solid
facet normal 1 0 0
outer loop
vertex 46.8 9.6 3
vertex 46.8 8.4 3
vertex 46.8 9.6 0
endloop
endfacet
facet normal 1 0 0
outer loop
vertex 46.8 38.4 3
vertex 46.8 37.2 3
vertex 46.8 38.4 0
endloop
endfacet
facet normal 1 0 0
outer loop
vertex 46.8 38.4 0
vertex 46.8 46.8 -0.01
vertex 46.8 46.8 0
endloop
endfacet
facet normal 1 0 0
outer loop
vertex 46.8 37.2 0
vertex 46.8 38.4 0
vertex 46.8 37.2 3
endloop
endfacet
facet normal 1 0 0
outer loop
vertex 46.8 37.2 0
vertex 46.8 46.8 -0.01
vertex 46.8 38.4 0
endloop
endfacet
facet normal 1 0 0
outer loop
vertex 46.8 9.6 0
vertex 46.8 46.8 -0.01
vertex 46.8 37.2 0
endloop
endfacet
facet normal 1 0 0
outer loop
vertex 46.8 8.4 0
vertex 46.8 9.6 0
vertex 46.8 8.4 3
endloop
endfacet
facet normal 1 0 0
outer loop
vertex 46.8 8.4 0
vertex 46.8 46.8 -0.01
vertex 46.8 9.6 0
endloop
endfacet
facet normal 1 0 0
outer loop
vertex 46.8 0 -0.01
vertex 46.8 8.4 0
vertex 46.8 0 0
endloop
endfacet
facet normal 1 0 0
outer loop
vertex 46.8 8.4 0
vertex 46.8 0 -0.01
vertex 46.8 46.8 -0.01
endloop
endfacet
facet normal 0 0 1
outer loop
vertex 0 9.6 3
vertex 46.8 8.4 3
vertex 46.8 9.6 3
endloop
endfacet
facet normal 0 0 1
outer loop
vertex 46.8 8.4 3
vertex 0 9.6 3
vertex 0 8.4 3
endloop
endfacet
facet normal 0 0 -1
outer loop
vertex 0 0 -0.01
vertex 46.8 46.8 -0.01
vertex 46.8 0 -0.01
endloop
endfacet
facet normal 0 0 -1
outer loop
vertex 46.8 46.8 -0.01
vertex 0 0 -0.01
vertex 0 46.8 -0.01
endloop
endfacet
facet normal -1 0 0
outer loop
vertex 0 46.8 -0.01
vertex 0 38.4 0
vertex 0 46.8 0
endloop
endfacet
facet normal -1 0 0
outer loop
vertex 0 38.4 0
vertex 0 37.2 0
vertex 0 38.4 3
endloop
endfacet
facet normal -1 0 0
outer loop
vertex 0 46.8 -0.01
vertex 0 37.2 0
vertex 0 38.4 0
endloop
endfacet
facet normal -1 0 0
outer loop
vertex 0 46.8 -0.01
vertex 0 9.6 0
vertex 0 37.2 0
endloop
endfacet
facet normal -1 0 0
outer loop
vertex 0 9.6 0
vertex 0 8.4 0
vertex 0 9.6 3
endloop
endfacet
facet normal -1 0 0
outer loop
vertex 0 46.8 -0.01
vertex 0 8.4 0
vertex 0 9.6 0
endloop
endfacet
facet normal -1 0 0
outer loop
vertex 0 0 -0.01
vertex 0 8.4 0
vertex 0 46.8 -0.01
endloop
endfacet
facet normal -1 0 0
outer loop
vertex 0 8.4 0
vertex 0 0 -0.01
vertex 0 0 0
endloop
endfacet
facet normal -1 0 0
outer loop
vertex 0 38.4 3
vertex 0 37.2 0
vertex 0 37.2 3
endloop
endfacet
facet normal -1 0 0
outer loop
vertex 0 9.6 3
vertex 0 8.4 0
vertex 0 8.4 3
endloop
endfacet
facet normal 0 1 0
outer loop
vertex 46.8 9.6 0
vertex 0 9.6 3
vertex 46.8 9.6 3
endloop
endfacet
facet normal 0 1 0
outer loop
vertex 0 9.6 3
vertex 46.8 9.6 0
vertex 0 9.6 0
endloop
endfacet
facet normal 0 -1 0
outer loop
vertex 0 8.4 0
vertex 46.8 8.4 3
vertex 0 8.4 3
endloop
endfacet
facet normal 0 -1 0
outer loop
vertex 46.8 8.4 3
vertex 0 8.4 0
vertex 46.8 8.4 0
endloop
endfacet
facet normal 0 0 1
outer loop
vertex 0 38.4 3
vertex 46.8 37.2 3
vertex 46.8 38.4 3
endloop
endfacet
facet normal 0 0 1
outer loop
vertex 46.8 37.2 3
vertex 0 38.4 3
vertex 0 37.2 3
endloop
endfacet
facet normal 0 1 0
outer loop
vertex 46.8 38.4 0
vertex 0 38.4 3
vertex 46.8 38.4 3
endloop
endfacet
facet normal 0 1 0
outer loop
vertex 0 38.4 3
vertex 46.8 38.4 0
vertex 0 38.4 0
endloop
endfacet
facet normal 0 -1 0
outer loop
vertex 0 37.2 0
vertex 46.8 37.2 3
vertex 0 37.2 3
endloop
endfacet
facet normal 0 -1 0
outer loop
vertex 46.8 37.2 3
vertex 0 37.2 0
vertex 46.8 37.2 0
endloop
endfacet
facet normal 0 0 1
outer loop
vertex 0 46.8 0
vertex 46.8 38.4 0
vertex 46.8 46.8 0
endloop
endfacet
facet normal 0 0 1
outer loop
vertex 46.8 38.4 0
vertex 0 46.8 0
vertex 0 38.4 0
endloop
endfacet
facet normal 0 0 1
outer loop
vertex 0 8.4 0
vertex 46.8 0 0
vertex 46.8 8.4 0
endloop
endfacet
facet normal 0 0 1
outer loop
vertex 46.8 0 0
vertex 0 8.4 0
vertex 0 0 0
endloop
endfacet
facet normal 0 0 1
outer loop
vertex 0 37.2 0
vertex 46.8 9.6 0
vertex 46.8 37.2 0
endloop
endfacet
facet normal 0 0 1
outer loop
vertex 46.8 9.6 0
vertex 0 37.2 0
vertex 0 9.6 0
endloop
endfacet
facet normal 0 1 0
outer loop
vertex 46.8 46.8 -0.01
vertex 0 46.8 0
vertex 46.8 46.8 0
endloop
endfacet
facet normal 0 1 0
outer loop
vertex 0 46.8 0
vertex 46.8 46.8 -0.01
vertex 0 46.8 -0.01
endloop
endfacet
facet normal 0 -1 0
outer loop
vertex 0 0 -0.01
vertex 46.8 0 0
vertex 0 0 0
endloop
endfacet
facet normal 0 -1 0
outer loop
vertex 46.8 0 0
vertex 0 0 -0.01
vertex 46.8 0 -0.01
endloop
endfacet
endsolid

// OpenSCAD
// file: ../Base/Helper.scad
// Fischertechnik Box Foundation
// Helper functions

include <PlacementOptions.scad>

// getRotation(rotations, i)
// gets the rotation with index i, even if rotations or rotations[i] is undefined.
// If undefined, NoRotation ist returned.
// rotations = list of Rotate-constants
// i = Index of the rotation
function getRotation(rotations, i) = (is_undef(rotations) || is_undef(rotations[i])) ? NoRotation : rotations[i];
// file: ../Base/PlacementOptions.scad
// Fischertechnik Box Foundation
// Placement Options

// Alignment
NoAlign = 0;
AlignLeft = 1;
AlignBottom = 2;
AlignCenter = 3;
AlignRight = 4;
AlignTop = 5;

// Element rotation degree steps
rotations = [0, -90, -180, -270];

// Rotation
NoRotation = 0;
Rotate0 = 0;
Rotate90 = 1;
Rotate180 = 2;
Rotate270 = 3;

// Docking (seen from above)
NoDock = -1;
DockLeft = 0;
DockTop = 1;
DockRight = 2;
DockCorner = 2;
DockBottom = 3;

// Web corners
LowerLeft = 0;
UpperLeft = 1;
UpperRight = 2;
LowerRight = 3;

// Web position relative to corner
LeftOfCorner = 0;
RightOfCorner = 1;
// file: ../Base/Boxes.scad
// Fischertechnik Box Foundation
// Pre-designed Boxes

use <Constants.scad>

include <PlacementOptions.scad>

box190Width = 190;
box190Depth = 130;
box130Width = 130;
box130Depth = 95;

// Values are from an original ec3 box
topBottomDifference = 1.5;
outerHeight = 40;
innerHeight = 38.2;
baseThickness = outerHeight - innerHeight;
stackExcess = 5.7;
radius = 3.5;
wallThickness = 1.5;
tolerance = 0.2;
stackOffset = innerHeight - stackExcess;

boxUsageHeight = stackOffset;
boxWallThickness = wallThickness;
boxBaseThickness = baseThickness;
boxWebWidth = 3.0;

// getBoxWallThickness()
// Gets the wall thickness of a Fischertechnik Box
function getBoxWallThickness() = boxWallThickness;

// getBoxUsageHeight()
// Gets the usable height of a Fischertechnik box
function getBoxUsageHeight() = boxUsageHeight;

// getBoxInnerHeight()
// Gets the inner height of a Fischertechnik box, including the stack excess
function getBoxInnerHeight() = innerHeight;

// getBoxBaseThickness()
// Gets the thickness of the Fischertechnik box base.
function getBoxBaseThickness() = boxBaseThickness;

// getBoxWebWidth()
// Gets the width of a box web
function getBoxWebWidth() = boxWebWidth;

// getBox190Space()
// Gets the usable inner space of a Box 190 as an x/y-list
function getBox190Space() = [
    box190Width - 2*getBoxWallThickness() - topBottomDifference, 
    box190Depth - 2*getBoxWallThickness() - topBottomDifference ];

// BoxBase(width, depth)
// Creates an empty stackable Fischertechnik compatible box
// width = Outer width of the box (190, 130, ...)
// depth = Outer depth of the box (130, 95, ...)

module BoxBase(width, depth, height=outerHeight) {    
    thinPlate = 0.01;

    innerHeight = height - baseThickness;    
    
    module BodyPlate(width, depth) {
        translate([radius, radius])
        hull() {
            w = width-2*radius;
            d = depth-2*radius;
            cube([w, d, thinPlate]);
            cylinder(thinPlate, r=radius, $fn=getFragments());
            translate([w, 0])
                cylinder(thinPlate, r=radius, $fn=getFragments());
            translate([w, d])
                cylinder(thinPlate, r=radius, $fn=getFragments());
            translate([0, d])
                cylinder(thinPlate, r=radius, $fn=getFragments());
        }
    }
    
    module Body(tolerance=tolerance) {
        hull() {
            // Bottom with tolerance to fit into the original boxes when stacked
            translate([-wallThickness+tolerance, -wallThickness+tolerance, -baseThickness])
                BodyPlate(width-topBottomDifference-2*tolerance, depth-topBottomDifference-2*tolerance);
            
            // Top
            translate([-wallThickness-topBottomDifference/2, -wallThickness-topBottomDifference/2, innerHeight-thinPlate])
                BodyPlate(width, depth);
         }
    }

    module Cutoff() {
        hull() {
            coWidth = width - 2*wallThickness;
            coDepth = depth - 2*wallThickness;
            
            // Bottom
            BodyPlate(coWidth-topBottomDifference, coDepth-topBottomDifference);

            // Top
            translate([-topBottomDifference/2, -topBottomDifference/2, innerHeight+thinPlate]) 
                BodyPlate(coWidth, coDepth);
        }
    }
    
    difference() {        
        Body();
        Cutoff();
        stackOffset = innerHeight - stackExcess;
        translate([0, 0, stackOffset + baseThickness])
            Body(tolerance=0);
    }
}

// Creates the Fischertechnik empty box 130x190 mm and places it at position 0,0
// 190x130 are the outer sizes, the inner space is slightly smaller. Use getBox190Space() to get the inner sizes.
// The box is positioned that the usable inner space is at the 0,0,0 position. The

module Box190() {
    BoxBase(box190Width, box190Depth);
}

// Gets the usable inner space of a Box 130 as an x/y-list
function getBox130Space() = [
    box130Width - 2*getBoxWallThickness() - topBottomDifference, 
    box130Depth - 2*getBoxWallThickness() - topBottomDifference ];

// Creates the Fischertechnik empty box 95x130 mm and places it at position 0,0
// 190x130 are the outer sizes, the inner space is slightly smaller. Use getBox190Space() to get the inner sizes.
// The box is positioned that the usable inner space is at the 0,0,0 position. The

module Box130() {
    BoxBase(box130Width, box130Depth);
}

// Creates a web at the specified box walls
// corner 0 = LowerLeft, 1 = UpperLeft, 2 = UpperRight, 3 = LowerRight
// side 0 = LeftOfCorner, 1 = RightOfCorner
// distance = Distance in mm from the corner
// boxSpace = inner width and depth of the box (default: Box 190)
// webWidth = length of the web (default is 3 mms)
// webThickness = thickness of the web (default is 1 mm)

module BoxWeb(corner, side, distance, boxSpace=getBox190Space(), webWidth=getBoxWebWidth(), webThickness=1.0) {
    sink = getBoxWallThickness()/2;

    width = (corner % 2 == 0) ? 
            (side == LeftOfCorner ? webWidth : webThickness) :
            (side == LeftOfCorner ? webThickness : webWidth);

    depth = (corner % 2 == 0) ? 
            (side == RightOfCorner ? webWidth : webThickness) :
            (side == RightOfCorner ? webThickness : webWidth);
    
    xDiff = corner == LowerLeft ? 
                (side == LeftOfCorner ? -sink : distance) :
            (corner == UpperLeft ?                
                (side == LeftOfCorner ? distance : -sink) :
            (corner == UpperRight ?
                (side == LeftOfCorner ? boxSpace.x-webWidth+sink : boxSpace.x-distance-webThickness) :
                (side == LeftOfCorner ? boxSpace.x-distance-webThickness: boxSpace.x-webWidth+sink)));

    yDiff = corner == LowerLeft ? 
                (side == RightOfCorner ? -sink : distance) :
            (corner == UpperLeft ?
                (side == RightOfCorner ? boxSpace.y-distance : boxSpace.y-webWidth+sink) :
            (corner == UpperRight ?
                (side == RightOfCorner ? boxSpace.y-webWidth+sink : boxSpace.y-distance) :
                (side == RightOfCorner ? distance : -sink)));
    
    translate([xDiff, yDiff, -getExcess()])
        cube([width, depth, boxUsageHeight + 2*getExcess()]);
}
// file: ../Base/Rotation.scad
// Fischertechnik Box Foundation
// Geometry Helpers Rotation

include <PlacementOptions.scad>

// getRotatedSpace(space, rotation=NoRotation)
// Rotates the space dependent on the specified rotation

function getRotatedSpace(space, rotation=NoRotation) = [
    (rotation == Rotate90 || rotation == Rotate270) ? space.y : space.x,
    (rotation == Rotate90 || rotation == Rotate270) ? space.x : space.y
];

// Rotates the given space around the fixed left lower corner
// space = the space the children needs as width/depth list [width,depth]
// rotation = 0 Rotate0 degrees, 1 Rotate90 degrees, 2 Rotate180 degrees, 3 Rotate270 degrees (equivalent to -90)

module RotateFix(space, rotation=NoRotation) {
    dy = (rotation == Rotate0 || rotation == Rotate270) ? 0 :
        (rotation == Rotate90) ? space.x :
        space.y;
    dx = (rotation < Rotate180) ? 0 :
        (rotation == Rotate180) ? space.x :
        space.y;
    
    translate([dx, dy, 0])
        rotate([0, 0, rotations[rotation]])
            children();
}
// file: ../Base/Alignment.scad
// Fischertechnik Box Foundation
// Geometry Helpers Alignment

include <PlacementOptions.scad>

// getAlignedX(elementWidth, spaceWidth, align=AlignRight, offset=0)
// Gets the aligned X offset of an element with the given
// width in the given space.
// elementWidth = The width of the element to positon
// spaceWidth = The space where the element should be aligned
// align = 0 AlignLeft, 1 AlignCenter, 2 AlignRight
// offset = an optional offset from the aligned position. When
// aligned left or centered, then positive values are in X direction.
// When aligned right then positive values are in negative X direction.

function getAlignedX(elementWidth, spaceWidth, align=AlignRight, offset=0) =
    (align == AlignLeft) ?
        offset :
        ((align == AlignCenter) ?
        (spaceWidth - elementWidth)/2 + offset :
        spaceWidth - offset - elementWidth);

// getAlignedY(elementDepth, spaceDepth, align=AlignTop, offset=0)
// Gets the aligned Y offset of an element with the given
// depth in the given space.
// elementDepth = The depth of the element to positon
// spaceDepth = The space where the element should be aligned
// align = 0 AlignBottom, 1 AlignCenter, 2 AlignTop
// offset = an optional offset from the aligned position. When
// aligned bottom or centered, then positive values are in Y direction.
// When aligned top then positive values are in negative Y direction.

function getAlignedY(elementDepth, spaceDepth, align=AlignTop, offset=0) =
    (align == AlignBottom) ?
        offset :
        ((align == AlignCenter) ?
        (spaceDepth - elementDepth)/2 + offset :
        spaceDepth - offset - elementDepth);
// file: ../Base/Placement.scad
// Fischertechnik Box Foundation
// Geometry Helpers Placement

use <Constants.scad>
use <Alignment.scad>
use <Rotation.scad>
use <Boxes.scad>

include <PlacementOptions.scad>

// Place(x=0, y=0, elementSpace=[0,0], alignX=AlignLeft, alignY=AlignBottom, rotation=Rotate0, boxSpace=getBox190Space())
// Places the child at the specified position
// y = Y-Position. This is a relative position when an X aligment is specified.
// x = X-Position. This is a relative position when an Y aligment is specified.
// elementSpace = space of the element to be placed [x,y]
// alignX = -1=NoAlign, 0 AlignLeft, 1 AlignCenter, 3 AlignRight (elementSpace and boxSpace required!)
// alignY = -1=NoAlign, 2 AlignBottom, 1 AlignCenter, 4 AlignTop (elementSpace and boxSpace required!)
// rotation = 0 Rotate0 0 degrees, 1 Rotate90 90 degrees, 
// 2 Rotate180 180 degrees, 3 Rotate270 270 degrees (equivalent to -90)
// boxSpace = Inner space of the box where the placement occurs [x,y] - default is Box 190x130 inner space

module Place(x=0, y=0, elementSpace=[0,0], 
  alignX=AlignLeft, alignY=AlignBottom, 
  rotation=NoRotation, boxSpace=getBox190Space()) {

    module Position(x, y, space, rotation=Rotate0) {
        translate([x, y, 0])
            RotateFix(space, rotation)
                children();
    }

    space = getRotatedSpace(elementSpace, rotation);
    alignedX = getAlignedX(space.x, boxSpace.x, alignX, x);
    alignedY = getAlignedY(space.y, boxSpace.y, alignY, y);
    Position(alignedX, alignedY, elementSpace, rotation)
        children();
}

// Center(space=getBox130Space(), elementSpace=[0,0])
// space = Space where the children is centered. For cylinder use centered=true and no elementSpace.
// elementSpace = space of the element to be centered [x,y]

module Center(space=getBox190Space(), elementSpace=[0,0]) {
    Place(elementSpace=elementSpace, boxSpace=space, alignX=AlignCenter, alignY=AlignCenter)
        children();
}

// CenterHorizontal(width=0, y=0, offset=0, space=getBox130Space())
// width = Width of the element to be placed.
// y = Y position of the element
// offset = Offset from the center position (negative will be left of the center)
// space = Space where the element is placed

module CenterHorizontal(width=0, y=0, offset=0, space=getBox190Space()) {
    Place(x=offset, y=y, elementSpace=[width, 0], boxSpace=space, alignX=AlignCenter)
        children(0);
}

// CenterVertical(depth=0, x=0, offset=0, space=getBox130Space())
// depth = Depth of the element to be placed.
// x = X position of the element
// offset = Offset from the center position (negative will be down of the center)
// space = Space where the element is placed

module CenterVertical(depth=0, x=0, offset=0, space=getBox190Space()) {
    Place(x=x, y=offset, elementSpace=[0, depth], boxSpace=space, alignY=AlignCenter)
        children(0);
}

// getIsVertical(align)
// True if the specified alignment needs a vertical orientation for a divider (AlignRight, AlignLeft)

function getIsVertical(align) = (align == AlignRight || align == AlignLeft);

// getIsHorizontal(align)
// True if the specified alignment needs a horizontal orientation for a divider (AlignTop, AlignBottom)

function getIsHorizontal(align) = (align == AlignTop || align == AlignBottom);
// file: ../Base/Constants.scad
// Fischertechnik Box Foundation
// Constants

// Constant values necessary for multiple elements

// Base constants
dividerThickness = 1.2;
excess = 0.01;
fragments = 90;
tolerance = 0.8;

// Gets the thickness of a divider 
function getDividerThickness() = dividerThickness;

// Gets the excess that is used to merge walls into each other
function getExcess() = excess;

// Gets amount of fragments of a cylinder
function getFragments() = fragments;

// Gets the inner tolerance of a frame to each side
function getTolerance() = tolerance;


// Fischertechnik specific constants
axisDiameter = 4;
axisBottomDiameter = axisDiameter + 1;
axisTolerance = 0.2;
standardEdgeDistance = 2.5;
standardWebDistance = 11.5;
standardCornerLength = 15;
tubeWallFactor = 0.8;
smallPartsFrameHeight = 20;

// Gets axis diameter of Fischertechnik axis
function getAxisDiameter() = axisDiameter;

// Gets axis diameter tolerance (subtracted for element axis)
function getAxisTolerance() = axisTolerance;

// Gets the axis diameter for standing axis
function getStandAxisDiameter() = getAxisDiameter() - getAxisTolerance();

// Gets axis bottom diameter for thicker part at the bottom
function getAxisBottomDiameter() = axisBottomDiameter;

// gets the standard distance to the wall of the box for dockable frames with webs
function getStandardEdgeDistance() = standardEdgeDistance;

// gets the standard distance of each web to the corner of the dockable frame
function getStandardWebDistance() = standardWebDistance;

// gets the standard length of the corner walls of a dockable frame
function getStandardCornerLength() = standardCornerLength;

// gets the wall thickness of a tube.
function getTubeWallThickness() = tubeWallFactor * getDividerThickness();

// gets the frame height for docked small parts boxes.
function getSmallPartsFrameHeight() = smallPartsFrameHeight;
// main file
// Fischertechnik Box Library
// Holder for Tire 45 (may be with flat hub)
// 31018, (31015)

use <../Base/Constants.scad>
use <../Base/Placement.scad>
use <../Base/Deployment.scad>
use <../ModelBase/Simple.scad>

/* [Element Parameters] */
count = 1;
height = 3; // [3, 6]

/* [Hidden] */
width = 46;
depth = 46;

// getHolderTire45Space(count=1)
// Gets the space the tire 45 holder needs as width and depth (.x and .y as a list)

function getHolderTire45Space(count=1, height=height) = [(width * count) + getTolerance(), depth + getTolerance(), height];

// HolderTire45(count=1)
// Tire 45 holder
// count = Count of tires in a row

module HolderTire45(count=1, height=height) {
    distance = 30;

    wallVolume = [
        getHolderTire45Space(count).x, 
        getDividerThickness(),
        height];

    webSpace = [
        wallVolume.x,
        distance
    ];

    Space(getHolderTire45Space(count));

    CenterVertical(distance, space=getHolderTire45Space(count))
    DeployVertical(distance, [wallVolume, wallVolume]) {
        Wall(wallVolume);
        Wall(wallVolume);
    }
}

// Test
color("lightgray")
HolderTire45(count, height);
